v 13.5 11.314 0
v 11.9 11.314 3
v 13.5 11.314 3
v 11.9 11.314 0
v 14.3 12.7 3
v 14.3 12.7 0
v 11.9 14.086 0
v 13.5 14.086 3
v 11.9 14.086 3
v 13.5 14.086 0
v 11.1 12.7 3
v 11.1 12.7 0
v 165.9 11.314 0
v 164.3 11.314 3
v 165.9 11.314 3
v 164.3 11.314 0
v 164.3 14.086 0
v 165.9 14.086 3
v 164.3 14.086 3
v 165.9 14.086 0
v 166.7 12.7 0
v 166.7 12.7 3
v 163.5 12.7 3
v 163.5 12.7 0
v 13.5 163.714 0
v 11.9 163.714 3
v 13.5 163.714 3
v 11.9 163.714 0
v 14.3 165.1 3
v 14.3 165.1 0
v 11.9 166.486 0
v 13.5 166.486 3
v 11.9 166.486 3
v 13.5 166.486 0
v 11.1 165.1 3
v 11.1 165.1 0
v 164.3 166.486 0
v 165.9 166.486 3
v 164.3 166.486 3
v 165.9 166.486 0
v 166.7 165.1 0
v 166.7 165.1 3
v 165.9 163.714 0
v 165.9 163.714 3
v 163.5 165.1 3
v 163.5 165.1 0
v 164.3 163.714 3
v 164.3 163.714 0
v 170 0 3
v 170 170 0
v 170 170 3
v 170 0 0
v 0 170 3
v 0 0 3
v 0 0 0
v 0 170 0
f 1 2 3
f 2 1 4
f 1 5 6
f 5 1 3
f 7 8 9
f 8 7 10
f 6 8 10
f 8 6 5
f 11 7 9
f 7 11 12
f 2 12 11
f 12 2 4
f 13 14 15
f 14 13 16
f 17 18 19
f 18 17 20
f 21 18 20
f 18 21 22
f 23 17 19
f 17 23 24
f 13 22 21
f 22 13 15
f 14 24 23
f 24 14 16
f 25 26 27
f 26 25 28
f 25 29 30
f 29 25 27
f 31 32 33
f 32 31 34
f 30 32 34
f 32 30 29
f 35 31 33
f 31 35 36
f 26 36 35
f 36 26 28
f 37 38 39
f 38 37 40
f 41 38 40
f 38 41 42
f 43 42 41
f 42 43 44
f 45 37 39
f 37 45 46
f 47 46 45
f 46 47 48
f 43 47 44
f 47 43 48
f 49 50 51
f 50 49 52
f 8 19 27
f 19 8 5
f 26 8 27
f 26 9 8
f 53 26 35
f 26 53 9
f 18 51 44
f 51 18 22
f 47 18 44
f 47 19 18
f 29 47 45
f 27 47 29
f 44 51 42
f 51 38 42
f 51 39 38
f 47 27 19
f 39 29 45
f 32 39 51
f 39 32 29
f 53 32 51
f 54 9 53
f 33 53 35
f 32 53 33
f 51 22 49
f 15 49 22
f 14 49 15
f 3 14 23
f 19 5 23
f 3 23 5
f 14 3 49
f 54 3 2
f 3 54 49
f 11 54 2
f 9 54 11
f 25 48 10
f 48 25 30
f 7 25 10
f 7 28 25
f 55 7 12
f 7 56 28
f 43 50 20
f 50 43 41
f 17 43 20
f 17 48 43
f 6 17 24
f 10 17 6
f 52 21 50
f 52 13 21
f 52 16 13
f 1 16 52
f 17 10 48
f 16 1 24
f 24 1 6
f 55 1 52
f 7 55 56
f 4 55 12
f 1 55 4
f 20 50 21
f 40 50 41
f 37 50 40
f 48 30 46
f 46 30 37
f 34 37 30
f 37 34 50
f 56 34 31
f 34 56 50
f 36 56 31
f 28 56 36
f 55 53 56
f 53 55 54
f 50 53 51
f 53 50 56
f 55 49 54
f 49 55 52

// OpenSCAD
module mini_itx_plate_with_holes() {
    // Dimensions of the Mini-ITX plate
    plate_x = 170;
    plate_y = 170;
    plate_z = 3; // 1/8 inch converted to nearest whole mm

    // Standoff locations in mm
    // Based on community-provided specifications for Mini-ITX
    locations = [
        [12.7, 12.7],
        [165.1, 12.7],
        [12.7, 165.1],
        [165.1, 165.1]
    ];

    // Radius for the mounting holes (slightly larger than 1.5mm radius for standoffs)
    hole_radius = 1.6;

    difference() {
        // The flat surface
        cube([plate_x, plate_y, plate_z]);

        // Holes for the standoffs
        for (loc = locations) {
            translate([loc[0], loc[1], -0.1]) { // -0.1 to ensure it cuts completely through
                cylinder(h = plate_z + 0.2, r = hole_radius);
            }
        }
    }
}

mini_itx_plate_with_holes();
